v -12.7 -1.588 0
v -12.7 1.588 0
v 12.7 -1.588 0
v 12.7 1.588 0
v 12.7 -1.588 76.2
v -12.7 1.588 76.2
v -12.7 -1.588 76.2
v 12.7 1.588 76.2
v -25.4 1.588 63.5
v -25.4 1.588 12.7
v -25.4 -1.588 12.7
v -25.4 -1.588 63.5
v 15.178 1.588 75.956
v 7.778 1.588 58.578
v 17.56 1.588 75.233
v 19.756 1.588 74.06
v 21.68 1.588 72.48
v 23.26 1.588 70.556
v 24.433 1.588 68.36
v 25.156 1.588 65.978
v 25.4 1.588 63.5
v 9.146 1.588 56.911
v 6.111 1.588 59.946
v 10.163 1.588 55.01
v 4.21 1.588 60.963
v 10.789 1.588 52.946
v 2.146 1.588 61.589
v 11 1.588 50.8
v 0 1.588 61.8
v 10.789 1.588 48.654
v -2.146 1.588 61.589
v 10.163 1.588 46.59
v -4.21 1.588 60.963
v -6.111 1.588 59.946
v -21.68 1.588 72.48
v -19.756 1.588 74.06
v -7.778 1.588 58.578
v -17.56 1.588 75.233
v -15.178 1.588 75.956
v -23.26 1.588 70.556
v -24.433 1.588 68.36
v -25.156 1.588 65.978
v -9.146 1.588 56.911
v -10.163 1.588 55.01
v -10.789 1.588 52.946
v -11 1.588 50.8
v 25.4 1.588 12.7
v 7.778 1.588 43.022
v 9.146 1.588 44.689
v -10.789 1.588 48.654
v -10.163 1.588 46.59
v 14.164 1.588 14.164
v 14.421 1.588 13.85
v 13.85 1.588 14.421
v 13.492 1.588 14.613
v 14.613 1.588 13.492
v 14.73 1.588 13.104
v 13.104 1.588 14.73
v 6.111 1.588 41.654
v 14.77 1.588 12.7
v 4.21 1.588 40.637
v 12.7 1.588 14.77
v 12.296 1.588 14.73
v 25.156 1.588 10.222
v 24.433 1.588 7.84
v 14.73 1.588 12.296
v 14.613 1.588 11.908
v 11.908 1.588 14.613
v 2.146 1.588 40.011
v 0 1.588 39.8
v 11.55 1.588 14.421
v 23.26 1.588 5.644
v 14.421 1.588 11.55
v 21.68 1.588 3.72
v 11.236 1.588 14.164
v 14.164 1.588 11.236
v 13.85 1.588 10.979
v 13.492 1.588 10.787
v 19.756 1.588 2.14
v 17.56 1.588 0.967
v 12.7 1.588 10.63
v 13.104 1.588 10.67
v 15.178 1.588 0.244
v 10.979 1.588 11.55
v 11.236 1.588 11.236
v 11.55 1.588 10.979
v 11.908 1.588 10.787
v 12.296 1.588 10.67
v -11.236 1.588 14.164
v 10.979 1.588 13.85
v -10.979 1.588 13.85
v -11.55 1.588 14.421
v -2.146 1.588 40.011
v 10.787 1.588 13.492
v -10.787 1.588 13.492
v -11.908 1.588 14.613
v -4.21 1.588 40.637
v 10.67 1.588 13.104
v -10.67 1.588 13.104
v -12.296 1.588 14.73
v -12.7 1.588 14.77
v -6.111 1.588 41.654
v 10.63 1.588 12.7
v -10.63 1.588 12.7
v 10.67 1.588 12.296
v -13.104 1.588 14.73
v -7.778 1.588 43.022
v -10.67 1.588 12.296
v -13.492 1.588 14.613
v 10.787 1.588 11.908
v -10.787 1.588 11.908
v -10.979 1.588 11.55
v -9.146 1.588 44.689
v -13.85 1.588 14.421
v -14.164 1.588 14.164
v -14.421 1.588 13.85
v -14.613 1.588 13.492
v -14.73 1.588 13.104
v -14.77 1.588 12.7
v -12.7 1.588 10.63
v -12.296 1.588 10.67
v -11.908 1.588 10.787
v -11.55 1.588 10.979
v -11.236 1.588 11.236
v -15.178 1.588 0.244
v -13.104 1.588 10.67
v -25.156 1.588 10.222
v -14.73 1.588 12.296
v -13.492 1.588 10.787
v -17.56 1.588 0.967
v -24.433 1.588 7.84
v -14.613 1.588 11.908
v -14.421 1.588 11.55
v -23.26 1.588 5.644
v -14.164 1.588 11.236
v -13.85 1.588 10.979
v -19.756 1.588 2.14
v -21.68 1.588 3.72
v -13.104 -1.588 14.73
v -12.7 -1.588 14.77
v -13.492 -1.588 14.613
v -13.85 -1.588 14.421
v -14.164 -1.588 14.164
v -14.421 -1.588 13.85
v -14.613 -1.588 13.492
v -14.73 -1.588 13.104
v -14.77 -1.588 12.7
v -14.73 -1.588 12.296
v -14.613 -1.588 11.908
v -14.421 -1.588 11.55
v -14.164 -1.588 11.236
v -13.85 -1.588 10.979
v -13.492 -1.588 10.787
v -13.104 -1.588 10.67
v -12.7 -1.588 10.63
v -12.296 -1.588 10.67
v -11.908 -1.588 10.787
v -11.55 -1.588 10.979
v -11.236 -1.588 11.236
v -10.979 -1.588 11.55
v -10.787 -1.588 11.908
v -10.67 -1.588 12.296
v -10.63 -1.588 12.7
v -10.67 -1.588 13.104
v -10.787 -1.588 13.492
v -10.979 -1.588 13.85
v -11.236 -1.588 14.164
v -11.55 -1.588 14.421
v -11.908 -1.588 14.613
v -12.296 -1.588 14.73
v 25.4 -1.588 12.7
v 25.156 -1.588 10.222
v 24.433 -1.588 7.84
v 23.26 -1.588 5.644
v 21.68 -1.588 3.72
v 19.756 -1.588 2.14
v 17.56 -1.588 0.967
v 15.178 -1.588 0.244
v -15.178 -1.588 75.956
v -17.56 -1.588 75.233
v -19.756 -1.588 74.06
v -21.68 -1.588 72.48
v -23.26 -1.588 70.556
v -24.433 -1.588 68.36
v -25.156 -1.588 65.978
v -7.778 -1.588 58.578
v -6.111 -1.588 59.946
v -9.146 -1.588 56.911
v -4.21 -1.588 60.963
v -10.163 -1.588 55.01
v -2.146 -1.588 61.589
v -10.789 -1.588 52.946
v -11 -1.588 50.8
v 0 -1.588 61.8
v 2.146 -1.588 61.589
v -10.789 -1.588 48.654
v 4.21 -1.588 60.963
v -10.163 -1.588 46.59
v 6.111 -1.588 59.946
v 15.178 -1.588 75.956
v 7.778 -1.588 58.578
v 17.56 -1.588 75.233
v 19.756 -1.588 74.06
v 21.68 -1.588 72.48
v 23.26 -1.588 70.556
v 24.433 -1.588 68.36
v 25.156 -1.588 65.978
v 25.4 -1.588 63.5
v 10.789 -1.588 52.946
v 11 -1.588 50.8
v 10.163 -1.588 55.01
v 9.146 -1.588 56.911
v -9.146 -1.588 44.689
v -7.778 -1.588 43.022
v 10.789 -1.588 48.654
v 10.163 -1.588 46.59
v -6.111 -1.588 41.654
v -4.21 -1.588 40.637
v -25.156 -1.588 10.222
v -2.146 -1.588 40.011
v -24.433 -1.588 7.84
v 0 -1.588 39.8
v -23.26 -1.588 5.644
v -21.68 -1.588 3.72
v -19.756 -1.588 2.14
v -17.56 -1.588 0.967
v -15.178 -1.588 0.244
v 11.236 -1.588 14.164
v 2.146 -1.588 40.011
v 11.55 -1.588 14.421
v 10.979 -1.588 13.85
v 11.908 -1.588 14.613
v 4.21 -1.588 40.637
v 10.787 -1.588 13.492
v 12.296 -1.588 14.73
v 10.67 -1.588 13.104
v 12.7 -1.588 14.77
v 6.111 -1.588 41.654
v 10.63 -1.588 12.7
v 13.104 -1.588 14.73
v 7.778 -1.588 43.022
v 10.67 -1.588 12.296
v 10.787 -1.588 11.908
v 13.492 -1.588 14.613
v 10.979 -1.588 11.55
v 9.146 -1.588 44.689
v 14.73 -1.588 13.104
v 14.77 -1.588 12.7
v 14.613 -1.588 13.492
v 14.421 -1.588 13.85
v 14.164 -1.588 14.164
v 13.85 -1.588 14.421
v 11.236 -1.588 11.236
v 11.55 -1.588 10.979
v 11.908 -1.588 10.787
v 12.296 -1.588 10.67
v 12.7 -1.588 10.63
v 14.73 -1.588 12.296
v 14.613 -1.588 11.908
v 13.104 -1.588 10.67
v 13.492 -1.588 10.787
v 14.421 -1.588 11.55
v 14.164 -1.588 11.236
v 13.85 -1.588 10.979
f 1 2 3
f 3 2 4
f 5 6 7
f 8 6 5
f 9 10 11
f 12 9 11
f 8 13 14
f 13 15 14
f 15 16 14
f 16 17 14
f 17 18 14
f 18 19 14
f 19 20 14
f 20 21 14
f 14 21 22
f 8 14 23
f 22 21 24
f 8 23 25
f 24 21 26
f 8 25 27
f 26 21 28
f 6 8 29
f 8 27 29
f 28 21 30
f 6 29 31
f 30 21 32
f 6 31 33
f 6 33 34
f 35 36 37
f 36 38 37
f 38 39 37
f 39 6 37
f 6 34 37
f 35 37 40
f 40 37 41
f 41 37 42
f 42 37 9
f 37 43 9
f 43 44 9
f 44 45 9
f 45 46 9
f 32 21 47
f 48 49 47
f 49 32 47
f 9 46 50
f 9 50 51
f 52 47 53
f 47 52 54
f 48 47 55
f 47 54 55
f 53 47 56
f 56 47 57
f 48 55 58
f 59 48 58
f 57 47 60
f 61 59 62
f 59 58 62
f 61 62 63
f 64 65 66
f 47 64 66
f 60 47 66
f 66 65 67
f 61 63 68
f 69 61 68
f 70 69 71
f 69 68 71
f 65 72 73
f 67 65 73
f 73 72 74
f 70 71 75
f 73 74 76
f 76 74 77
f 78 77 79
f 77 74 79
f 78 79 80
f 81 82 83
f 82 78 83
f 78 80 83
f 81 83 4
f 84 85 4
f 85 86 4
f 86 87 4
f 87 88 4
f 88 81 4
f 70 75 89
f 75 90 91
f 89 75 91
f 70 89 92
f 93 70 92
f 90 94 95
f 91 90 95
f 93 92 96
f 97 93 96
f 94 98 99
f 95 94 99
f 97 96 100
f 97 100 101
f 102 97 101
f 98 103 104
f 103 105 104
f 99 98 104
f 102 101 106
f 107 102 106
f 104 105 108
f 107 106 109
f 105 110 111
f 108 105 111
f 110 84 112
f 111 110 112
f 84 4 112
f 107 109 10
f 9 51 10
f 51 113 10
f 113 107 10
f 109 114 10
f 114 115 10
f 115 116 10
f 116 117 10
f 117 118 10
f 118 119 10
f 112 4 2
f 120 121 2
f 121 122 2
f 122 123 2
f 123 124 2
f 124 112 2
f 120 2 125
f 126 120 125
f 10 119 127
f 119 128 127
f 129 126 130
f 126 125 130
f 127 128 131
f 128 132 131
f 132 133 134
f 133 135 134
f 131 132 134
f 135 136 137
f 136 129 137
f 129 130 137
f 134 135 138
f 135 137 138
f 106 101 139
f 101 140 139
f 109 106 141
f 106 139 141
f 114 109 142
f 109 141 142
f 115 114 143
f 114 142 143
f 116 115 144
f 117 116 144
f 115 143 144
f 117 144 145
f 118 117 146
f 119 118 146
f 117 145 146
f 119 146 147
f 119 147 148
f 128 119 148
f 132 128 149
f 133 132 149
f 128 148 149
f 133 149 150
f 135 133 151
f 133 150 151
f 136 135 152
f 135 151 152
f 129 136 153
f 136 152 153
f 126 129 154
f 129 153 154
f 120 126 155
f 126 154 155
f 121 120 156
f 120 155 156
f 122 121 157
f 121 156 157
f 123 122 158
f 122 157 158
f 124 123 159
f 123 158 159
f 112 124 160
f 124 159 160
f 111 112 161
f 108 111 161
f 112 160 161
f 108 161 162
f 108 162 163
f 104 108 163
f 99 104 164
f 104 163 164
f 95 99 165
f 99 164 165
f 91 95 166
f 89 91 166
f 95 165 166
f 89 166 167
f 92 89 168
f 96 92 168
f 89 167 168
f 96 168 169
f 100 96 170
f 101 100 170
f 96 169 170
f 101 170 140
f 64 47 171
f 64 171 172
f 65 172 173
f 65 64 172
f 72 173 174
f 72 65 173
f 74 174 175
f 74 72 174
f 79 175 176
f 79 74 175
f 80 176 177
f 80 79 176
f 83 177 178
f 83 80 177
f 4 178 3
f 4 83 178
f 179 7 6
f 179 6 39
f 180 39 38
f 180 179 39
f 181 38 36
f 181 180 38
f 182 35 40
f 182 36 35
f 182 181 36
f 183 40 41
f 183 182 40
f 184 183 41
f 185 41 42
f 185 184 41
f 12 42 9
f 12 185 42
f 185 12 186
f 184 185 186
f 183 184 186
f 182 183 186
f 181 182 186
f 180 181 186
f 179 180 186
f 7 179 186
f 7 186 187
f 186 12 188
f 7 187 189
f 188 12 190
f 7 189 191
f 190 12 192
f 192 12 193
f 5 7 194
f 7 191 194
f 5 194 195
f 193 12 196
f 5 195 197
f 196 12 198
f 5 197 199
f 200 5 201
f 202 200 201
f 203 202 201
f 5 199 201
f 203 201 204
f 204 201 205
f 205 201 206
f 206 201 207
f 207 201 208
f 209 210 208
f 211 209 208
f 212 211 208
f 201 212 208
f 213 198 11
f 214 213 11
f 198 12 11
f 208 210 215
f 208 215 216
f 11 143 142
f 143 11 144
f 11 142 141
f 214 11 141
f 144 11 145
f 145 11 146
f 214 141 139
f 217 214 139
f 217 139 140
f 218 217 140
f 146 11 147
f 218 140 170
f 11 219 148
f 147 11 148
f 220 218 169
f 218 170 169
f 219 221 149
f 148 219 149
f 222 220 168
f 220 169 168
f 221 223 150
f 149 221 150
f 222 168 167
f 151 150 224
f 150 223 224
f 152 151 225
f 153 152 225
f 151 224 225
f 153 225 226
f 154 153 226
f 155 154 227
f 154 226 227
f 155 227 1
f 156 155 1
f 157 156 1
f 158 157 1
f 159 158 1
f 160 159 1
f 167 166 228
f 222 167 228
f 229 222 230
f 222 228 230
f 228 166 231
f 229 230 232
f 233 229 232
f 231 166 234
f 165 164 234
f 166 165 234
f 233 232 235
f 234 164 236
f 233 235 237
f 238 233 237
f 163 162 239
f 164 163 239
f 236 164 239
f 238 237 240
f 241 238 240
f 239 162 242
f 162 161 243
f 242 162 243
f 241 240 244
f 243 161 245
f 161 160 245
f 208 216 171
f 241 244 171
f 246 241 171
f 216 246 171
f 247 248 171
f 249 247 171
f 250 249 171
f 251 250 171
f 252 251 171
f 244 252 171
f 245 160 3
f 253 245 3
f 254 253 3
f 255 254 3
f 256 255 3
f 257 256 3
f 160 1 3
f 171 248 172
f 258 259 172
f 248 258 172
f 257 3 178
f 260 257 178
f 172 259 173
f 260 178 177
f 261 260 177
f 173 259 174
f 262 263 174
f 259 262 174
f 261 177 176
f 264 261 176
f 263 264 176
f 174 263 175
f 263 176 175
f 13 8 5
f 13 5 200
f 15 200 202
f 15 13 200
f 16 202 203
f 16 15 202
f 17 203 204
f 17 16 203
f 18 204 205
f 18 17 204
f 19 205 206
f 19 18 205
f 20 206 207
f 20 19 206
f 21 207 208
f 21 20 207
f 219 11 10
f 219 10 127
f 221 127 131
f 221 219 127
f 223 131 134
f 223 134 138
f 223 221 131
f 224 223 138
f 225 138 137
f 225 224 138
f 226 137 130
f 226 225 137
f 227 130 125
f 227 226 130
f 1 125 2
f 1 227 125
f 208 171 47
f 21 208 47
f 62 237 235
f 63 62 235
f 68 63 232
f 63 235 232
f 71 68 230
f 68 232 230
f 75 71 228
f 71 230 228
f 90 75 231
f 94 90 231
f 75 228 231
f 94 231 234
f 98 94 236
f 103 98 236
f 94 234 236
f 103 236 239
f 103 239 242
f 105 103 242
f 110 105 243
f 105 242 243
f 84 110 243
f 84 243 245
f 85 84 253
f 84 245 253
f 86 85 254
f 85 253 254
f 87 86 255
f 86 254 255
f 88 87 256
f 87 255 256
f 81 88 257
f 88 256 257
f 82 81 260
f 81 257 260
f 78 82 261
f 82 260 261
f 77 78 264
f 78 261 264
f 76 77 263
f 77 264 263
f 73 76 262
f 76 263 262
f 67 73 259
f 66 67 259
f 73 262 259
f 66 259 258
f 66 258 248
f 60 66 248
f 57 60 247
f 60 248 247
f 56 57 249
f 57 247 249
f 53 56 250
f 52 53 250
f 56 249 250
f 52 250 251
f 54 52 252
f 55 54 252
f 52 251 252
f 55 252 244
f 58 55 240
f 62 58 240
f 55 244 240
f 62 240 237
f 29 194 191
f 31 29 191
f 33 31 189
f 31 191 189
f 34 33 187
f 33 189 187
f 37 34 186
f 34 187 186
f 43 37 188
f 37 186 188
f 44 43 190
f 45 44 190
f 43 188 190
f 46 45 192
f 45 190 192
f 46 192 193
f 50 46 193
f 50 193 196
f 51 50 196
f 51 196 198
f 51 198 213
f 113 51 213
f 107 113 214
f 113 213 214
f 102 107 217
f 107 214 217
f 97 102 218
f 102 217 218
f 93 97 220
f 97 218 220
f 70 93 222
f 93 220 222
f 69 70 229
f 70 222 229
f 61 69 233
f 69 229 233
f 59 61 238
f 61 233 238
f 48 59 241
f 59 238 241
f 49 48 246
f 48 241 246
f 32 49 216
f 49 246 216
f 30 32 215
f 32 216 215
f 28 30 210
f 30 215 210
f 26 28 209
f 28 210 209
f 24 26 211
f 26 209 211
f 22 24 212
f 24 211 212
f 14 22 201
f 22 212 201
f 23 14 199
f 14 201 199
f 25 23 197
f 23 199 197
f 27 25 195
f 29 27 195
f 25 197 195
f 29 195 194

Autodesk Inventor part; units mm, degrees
ref_plane "YZ Plane" through (0, 0, 0) normal (1, 0, 0) x (0, 1, 0)
ref_plane "XZ Plane" through (0, 0, 0) normal (0, 1, 0) x (-1, 0, 0)
ref_plane "XY Plane" through (0, 0, 0) normal (0, 0, 1) x (1, 0, 0)
sketch "Sketch1" plane through (0, 0, 0) normal (0, 0, 1) x (1, 0, 0)
  line L0 (-25.4, -1.5875) -> (25.4, -1.5875)
  line L1 (25.4, -1.5875) -> (25.4, 1.5875)
  line L2 (25.4, 1.5875) -> (-25.4, 1.5875)
  line L3 (-25.4, 1.5875) -> (-25.4, -1.5875)
  line L4 (-25.4, -1.5875) -> (25.4, 1.5875) construction
  line L5 (25.4, -1.5875) -> (-25.4, 1.5875) construction
  point P0 (0, 0)
  dimension "d0" = 3.175
  dimension "d1" = 50.8
extrude "Extrusion1" add sketch "Sketch1" along normal blind 76.2
sketch "Sketch2" plane through (-25.4, 1.5875, 0) normal (0, 1, 0) x (1, 0, 0)
  line L0 (50.8, 0) -> (50.8, -76.2) projected
  line L1 (0, 0) -> (0, -76.2) projected
  line L2 (50.8, 0) -> (0, 0) projected
  line L3 (50.8, -76.2) -> (0, -76.2) projected
  point P0 (25.4, 0)
  point P1 (38.1, -12.7)
  point P2 (12.7, -12.7)
  point P3 (25.4, -50.8)
  dimension "d4" = 12.7
  dimension "d5" = 12.7
  dimension "d6" = 12.7
  dimension "d7" = 12.7
  dimension "d8" = 25.4
  dimension "d9" = 25.4
hole "Hole1" at (12.7, 1.5875, 12.7) at (-12.7, 1.5875, 12.7) direction (0, -1, 0) diameter 4.1402 end through all
hole "Hole2" at (0, 1.5875, 50.8) direction (0, -1, 0) diameter 22 end through all
fillet "Fillet1" radius 12.7 4 edges at (-25.4, 0, 0) (25.4, 0, 0) (25.4, 0, 76.2) (-25.4, 0, 76.2)
properties part number "C33_TK_IdiotLightBracket" material "Polycarbonate, Clear"
